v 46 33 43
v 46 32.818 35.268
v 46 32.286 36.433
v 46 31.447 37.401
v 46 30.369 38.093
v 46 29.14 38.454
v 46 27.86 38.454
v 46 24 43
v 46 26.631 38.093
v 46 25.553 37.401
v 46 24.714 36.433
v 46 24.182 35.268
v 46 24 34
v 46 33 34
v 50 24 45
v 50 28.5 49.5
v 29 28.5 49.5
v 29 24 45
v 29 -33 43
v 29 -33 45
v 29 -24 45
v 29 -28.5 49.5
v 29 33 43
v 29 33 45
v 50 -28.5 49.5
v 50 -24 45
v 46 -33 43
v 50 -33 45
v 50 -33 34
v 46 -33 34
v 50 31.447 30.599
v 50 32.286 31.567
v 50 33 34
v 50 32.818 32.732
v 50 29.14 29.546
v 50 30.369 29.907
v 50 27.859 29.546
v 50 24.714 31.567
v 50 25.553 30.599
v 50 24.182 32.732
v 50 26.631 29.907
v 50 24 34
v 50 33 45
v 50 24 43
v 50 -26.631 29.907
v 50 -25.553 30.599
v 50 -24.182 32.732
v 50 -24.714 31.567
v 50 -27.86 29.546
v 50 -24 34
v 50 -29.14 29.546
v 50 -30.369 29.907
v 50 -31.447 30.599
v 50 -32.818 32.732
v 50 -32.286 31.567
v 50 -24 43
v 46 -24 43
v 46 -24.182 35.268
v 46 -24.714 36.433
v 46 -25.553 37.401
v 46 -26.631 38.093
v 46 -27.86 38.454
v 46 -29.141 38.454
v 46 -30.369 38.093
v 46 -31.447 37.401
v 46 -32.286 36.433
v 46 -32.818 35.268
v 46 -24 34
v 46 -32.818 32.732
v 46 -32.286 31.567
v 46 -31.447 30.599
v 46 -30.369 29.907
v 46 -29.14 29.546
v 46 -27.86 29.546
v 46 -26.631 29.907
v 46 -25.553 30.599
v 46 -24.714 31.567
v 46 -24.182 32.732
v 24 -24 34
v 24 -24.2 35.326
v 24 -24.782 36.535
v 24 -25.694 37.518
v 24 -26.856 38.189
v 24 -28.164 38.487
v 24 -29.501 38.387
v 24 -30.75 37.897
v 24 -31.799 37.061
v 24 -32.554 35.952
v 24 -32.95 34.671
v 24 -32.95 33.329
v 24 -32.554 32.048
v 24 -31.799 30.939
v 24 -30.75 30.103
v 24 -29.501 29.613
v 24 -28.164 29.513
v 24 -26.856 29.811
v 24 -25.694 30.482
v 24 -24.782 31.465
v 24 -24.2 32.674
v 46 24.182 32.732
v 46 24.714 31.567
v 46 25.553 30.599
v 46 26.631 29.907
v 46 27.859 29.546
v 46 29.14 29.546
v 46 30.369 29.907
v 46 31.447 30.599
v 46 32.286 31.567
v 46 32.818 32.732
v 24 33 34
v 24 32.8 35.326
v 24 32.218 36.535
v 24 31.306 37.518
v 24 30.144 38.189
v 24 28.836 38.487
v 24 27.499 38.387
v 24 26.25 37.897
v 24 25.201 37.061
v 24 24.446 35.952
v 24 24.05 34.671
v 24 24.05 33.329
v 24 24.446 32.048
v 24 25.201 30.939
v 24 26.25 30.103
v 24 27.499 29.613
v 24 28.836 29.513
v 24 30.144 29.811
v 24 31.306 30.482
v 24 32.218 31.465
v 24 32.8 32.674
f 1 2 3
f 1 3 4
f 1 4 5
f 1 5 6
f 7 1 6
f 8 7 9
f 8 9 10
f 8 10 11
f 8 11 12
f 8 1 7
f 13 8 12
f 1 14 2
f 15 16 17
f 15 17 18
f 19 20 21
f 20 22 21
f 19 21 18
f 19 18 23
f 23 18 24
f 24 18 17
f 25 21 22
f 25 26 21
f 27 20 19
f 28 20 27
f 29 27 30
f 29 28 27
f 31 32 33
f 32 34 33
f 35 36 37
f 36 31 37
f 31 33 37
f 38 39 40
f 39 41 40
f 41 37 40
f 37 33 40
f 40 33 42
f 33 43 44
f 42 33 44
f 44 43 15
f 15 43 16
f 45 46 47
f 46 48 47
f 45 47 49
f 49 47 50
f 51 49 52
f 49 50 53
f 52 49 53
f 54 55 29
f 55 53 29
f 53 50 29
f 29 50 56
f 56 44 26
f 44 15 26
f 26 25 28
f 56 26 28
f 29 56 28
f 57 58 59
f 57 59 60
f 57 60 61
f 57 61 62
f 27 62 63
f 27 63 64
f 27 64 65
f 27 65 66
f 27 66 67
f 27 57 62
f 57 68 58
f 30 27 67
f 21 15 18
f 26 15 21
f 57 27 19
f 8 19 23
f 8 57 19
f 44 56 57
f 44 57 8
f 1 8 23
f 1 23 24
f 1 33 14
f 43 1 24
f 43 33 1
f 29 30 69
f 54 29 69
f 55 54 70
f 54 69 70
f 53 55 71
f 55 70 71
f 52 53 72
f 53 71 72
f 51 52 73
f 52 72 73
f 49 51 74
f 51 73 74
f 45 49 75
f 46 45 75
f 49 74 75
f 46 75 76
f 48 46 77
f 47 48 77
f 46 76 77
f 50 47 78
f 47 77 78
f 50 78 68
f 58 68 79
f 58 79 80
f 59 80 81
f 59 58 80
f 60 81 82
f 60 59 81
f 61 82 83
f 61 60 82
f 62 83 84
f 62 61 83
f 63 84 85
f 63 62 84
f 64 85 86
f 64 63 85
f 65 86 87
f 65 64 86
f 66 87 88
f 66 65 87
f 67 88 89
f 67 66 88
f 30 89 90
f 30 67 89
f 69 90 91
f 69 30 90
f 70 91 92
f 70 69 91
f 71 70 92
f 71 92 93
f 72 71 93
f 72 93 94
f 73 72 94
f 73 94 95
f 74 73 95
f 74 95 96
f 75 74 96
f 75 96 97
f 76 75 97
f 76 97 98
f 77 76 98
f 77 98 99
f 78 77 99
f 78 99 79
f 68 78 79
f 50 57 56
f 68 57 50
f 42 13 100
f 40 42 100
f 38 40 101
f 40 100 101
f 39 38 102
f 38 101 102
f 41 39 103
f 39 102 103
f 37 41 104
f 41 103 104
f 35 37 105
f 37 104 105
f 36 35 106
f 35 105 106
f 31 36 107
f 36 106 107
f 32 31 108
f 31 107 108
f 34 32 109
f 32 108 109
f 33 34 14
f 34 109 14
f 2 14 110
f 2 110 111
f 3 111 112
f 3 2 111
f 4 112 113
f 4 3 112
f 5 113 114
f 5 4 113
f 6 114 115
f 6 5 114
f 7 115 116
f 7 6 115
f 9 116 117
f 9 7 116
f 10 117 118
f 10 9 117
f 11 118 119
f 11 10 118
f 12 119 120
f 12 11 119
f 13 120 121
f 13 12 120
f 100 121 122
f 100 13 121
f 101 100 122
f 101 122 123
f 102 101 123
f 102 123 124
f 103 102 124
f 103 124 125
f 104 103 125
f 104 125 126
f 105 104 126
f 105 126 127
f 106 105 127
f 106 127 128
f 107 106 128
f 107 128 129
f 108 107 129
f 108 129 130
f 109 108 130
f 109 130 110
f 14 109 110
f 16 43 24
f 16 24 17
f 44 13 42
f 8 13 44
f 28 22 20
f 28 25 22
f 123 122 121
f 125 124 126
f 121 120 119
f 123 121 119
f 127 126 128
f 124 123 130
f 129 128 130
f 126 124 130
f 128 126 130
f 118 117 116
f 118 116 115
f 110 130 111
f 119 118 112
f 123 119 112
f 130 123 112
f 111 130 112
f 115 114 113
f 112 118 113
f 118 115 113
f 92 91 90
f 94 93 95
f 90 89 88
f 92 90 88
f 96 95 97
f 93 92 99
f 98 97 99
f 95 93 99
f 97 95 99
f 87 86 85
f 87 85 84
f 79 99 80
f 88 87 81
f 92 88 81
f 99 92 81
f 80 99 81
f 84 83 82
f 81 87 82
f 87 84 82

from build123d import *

# Parameters (mm, degrees)
PAD047_DEPTH      = 4
SKETCH067_R       = 4.5
PAD048_DEPTH      = 22
PAD049_DEPTH      = 4
PAD049_DEPTH_BACK = 17


with BuildPart() as part:
    # Sketch066 → Pad047 (new body)
    with BuildSketch(Plane.YZ):
        with BuildLine():
            Line((-33, 33.999821), (-33, 45))
            Line((-33, 45), (33, 45))
            Line((33, 45), (33, 33.999804))
            ThreePointArc((24, 34), (28.499902, 29.5), (33, 33.999804))
            Line((24, 34), (24, 43))
            Line((24, 43), (-24, 43))
            Line((-24, 43), (-24, 34))
            ThreePointArc((-33, 33.999821), (-28.499911, 29.5), (-24, 34))
        make_face()
    extrude(amount=PAD047_DEPTH)

    # Sketch067 → Pad048 (join)
    with BuildSketch(Plane.YZ):
        with Locations((-28.5, 34)):
            Circle(SKETCH067_R)
        with Locations((28.5, 34)):
            Circle(SKETCH067_R)
    extrude(amount=-PAD048_DEPTH)

    # Sketch068 → Pad049 (join, two sides)
    with BuildSketch(Plane.YZ) as pad049_sk:
        Polygon((-33, 45), (-33, 43), (33, 43), (33, 45), (28.5, 49.5), (24, 45), (-24, 45), (-28.5, 49.5), align=None)
    extrude(amount=PAD049_DEPTH)
    extrude(pad049_sk.sketch, amount=-PAD049_DEPTH_BACK)


with BuildPart() as part_1:
    # Body031 placement: moved
    add(part.part.moved(Location((46, 0, 0))))


solid = part_1.part
